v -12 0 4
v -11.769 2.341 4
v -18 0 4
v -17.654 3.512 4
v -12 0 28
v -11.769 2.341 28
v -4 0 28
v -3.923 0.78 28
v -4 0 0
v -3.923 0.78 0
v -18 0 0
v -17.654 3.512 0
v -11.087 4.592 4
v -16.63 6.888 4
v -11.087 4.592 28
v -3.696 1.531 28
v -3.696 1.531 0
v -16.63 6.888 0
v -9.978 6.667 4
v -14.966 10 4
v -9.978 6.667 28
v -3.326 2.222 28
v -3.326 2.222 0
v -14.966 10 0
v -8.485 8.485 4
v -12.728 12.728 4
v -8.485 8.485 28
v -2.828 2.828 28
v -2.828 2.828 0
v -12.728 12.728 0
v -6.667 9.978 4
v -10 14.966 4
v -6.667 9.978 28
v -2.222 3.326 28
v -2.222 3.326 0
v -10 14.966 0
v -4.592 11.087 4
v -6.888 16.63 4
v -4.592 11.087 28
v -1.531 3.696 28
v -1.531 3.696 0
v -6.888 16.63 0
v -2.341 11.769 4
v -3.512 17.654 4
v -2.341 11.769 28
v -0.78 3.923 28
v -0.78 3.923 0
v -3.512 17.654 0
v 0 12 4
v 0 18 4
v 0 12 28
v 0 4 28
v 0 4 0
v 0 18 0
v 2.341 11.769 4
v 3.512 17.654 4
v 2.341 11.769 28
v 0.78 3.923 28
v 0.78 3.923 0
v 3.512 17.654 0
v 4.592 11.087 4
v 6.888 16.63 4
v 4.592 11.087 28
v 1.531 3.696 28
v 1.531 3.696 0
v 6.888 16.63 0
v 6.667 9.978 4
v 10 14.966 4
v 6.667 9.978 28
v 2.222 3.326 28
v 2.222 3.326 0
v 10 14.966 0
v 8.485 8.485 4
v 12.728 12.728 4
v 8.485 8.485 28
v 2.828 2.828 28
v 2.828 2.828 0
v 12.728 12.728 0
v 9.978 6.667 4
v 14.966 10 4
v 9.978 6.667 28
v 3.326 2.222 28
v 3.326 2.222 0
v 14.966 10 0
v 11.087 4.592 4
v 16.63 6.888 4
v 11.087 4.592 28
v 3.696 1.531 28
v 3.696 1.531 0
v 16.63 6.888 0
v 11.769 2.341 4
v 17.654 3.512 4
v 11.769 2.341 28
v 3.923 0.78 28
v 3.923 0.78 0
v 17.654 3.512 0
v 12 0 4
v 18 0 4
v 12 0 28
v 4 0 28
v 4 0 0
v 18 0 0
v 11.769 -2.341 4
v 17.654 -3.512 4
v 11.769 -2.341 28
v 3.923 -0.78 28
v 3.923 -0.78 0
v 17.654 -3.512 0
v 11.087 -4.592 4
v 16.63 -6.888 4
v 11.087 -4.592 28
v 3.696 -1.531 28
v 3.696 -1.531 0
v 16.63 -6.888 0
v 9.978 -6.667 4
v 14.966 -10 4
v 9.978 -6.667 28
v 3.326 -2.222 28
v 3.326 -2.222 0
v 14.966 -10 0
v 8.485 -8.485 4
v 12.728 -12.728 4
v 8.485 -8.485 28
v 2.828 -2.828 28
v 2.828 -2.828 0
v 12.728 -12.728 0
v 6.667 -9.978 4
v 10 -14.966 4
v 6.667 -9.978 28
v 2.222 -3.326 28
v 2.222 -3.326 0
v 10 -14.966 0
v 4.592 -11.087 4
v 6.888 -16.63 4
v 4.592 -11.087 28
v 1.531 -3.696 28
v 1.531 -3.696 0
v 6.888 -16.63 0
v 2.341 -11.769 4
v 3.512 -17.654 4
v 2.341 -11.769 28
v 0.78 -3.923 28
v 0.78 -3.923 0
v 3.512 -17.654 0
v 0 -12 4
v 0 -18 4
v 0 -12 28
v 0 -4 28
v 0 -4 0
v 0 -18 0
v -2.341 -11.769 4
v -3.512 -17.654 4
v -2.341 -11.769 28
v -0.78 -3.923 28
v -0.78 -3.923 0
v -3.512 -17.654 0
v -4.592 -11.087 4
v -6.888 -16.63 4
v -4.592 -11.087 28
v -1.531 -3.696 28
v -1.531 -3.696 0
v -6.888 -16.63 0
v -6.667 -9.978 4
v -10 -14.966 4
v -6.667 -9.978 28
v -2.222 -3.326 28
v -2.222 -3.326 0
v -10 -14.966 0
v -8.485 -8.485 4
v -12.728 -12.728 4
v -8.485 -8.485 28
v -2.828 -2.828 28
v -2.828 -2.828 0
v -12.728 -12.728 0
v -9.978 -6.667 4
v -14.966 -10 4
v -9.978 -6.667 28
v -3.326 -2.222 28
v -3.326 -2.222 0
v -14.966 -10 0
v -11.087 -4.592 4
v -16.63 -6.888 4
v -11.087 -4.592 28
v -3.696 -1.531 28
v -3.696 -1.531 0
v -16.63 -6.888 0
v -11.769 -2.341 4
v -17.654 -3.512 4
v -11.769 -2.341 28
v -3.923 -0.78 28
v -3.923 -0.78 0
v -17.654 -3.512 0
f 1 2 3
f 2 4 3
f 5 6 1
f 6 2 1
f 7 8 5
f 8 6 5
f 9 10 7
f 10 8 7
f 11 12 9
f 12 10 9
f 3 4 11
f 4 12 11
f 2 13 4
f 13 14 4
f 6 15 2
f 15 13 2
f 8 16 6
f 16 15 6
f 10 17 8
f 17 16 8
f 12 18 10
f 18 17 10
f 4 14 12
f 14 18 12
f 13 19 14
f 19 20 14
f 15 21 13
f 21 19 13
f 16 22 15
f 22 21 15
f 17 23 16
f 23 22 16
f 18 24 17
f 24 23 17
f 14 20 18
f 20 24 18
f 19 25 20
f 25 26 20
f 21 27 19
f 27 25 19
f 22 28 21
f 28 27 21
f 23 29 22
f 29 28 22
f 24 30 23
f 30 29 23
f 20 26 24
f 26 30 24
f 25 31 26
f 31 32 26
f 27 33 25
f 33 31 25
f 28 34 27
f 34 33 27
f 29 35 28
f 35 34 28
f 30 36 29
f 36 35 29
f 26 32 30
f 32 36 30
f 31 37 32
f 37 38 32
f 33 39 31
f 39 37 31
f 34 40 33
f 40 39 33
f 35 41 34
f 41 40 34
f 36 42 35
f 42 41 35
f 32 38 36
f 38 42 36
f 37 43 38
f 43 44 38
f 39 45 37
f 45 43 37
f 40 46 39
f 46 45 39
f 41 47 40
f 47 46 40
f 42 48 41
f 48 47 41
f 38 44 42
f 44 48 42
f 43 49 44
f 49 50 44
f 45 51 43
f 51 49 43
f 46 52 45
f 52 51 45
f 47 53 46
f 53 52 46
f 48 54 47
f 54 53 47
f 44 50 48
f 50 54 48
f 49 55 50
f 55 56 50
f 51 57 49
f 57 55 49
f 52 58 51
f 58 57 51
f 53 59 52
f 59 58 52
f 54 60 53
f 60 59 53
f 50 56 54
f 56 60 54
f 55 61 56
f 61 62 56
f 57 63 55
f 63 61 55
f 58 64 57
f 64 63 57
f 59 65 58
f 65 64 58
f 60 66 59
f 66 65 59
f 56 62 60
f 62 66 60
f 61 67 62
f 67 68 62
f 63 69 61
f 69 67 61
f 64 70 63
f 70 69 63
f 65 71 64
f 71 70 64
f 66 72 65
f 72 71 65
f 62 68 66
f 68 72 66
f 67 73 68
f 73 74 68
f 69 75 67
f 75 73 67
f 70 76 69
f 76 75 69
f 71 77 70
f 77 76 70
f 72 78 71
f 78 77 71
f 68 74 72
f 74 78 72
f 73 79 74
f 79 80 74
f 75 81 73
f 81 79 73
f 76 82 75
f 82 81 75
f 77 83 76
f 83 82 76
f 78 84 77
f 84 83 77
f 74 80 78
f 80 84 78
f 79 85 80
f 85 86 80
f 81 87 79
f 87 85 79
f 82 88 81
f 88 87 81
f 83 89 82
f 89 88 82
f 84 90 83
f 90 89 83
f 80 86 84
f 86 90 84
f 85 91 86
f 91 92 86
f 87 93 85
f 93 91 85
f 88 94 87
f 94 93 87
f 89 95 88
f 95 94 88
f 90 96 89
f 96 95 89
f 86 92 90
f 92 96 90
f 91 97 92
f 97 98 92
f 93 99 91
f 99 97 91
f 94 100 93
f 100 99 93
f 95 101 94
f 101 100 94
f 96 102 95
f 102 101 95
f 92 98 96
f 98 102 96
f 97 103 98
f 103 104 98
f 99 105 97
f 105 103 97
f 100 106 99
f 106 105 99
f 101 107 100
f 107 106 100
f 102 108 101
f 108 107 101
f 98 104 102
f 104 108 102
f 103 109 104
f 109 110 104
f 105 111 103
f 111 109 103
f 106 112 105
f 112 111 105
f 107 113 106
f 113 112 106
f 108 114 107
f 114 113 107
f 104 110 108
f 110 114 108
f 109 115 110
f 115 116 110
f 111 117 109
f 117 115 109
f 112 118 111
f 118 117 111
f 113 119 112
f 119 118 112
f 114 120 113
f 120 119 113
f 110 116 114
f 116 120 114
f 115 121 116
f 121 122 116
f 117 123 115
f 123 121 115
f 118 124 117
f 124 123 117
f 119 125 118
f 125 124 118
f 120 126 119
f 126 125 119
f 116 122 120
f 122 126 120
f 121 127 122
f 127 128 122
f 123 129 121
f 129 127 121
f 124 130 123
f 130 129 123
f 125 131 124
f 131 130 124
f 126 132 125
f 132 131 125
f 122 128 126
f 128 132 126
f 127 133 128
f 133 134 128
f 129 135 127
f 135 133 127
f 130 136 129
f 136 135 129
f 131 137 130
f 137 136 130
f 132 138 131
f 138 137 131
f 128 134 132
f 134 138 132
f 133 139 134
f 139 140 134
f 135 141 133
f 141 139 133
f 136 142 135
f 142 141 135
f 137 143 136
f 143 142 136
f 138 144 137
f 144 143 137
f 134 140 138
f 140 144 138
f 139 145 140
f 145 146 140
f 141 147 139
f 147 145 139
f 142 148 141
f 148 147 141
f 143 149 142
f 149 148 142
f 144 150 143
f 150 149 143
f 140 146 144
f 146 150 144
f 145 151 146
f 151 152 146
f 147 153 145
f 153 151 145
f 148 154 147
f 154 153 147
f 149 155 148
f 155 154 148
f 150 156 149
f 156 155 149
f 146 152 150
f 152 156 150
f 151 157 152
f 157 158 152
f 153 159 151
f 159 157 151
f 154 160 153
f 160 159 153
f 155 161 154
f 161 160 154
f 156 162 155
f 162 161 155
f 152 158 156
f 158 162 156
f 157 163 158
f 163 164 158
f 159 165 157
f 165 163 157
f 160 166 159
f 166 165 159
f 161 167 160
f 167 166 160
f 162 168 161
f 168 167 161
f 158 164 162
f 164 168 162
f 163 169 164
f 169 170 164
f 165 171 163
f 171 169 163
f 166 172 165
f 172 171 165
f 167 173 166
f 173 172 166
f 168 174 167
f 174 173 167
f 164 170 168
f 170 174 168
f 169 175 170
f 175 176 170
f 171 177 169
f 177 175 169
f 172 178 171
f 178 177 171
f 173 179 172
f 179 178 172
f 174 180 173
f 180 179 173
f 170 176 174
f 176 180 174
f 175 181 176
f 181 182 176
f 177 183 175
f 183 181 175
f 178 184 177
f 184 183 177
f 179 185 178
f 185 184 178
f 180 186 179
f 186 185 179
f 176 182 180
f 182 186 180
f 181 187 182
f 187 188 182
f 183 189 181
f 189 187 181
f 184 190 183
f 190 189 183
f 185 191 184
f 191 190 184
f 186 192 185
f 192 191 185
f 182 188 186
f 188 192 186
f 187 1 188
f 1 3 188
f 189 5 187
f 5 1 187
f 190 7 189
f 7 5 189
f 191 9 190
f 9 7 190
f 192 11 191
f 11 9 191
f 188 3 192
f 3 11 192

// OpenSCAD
$fn = 32;

// ----------------------------------------------------------------------
// Revolved part: flanged bushing R18
// ----------------------------------------------------------------------

// --- parameters (mm) ---
bore_r = 4;               // bore radius
flange_r = 18;            // flange radius
flange_h = 4;             // flange thickness
sleeve_r = 12;            // sleeve radius
total_h = 28;             // overall height
revolve_angle = 360;      // revolve sweep, degrees
fit_tol = 0.05;           // declared fit tolerance (prompt contract)
free_tol = 0.2;           // declared free tolerance (prompt contract)

bore_d = 2 * bore_r;
flange_d = 2 * flange_r;
sleeve_d = 2 * sleeve_r;

profile = [[4, 0], [18, 0], [18, 4], [12, 4], [12, 28], [4, 28]];  // primary outline, 6 points, counter clockwise

// --- the one profile operation ---
rotate_extrude(angle = revolve_angle) polygon(points = profile);
